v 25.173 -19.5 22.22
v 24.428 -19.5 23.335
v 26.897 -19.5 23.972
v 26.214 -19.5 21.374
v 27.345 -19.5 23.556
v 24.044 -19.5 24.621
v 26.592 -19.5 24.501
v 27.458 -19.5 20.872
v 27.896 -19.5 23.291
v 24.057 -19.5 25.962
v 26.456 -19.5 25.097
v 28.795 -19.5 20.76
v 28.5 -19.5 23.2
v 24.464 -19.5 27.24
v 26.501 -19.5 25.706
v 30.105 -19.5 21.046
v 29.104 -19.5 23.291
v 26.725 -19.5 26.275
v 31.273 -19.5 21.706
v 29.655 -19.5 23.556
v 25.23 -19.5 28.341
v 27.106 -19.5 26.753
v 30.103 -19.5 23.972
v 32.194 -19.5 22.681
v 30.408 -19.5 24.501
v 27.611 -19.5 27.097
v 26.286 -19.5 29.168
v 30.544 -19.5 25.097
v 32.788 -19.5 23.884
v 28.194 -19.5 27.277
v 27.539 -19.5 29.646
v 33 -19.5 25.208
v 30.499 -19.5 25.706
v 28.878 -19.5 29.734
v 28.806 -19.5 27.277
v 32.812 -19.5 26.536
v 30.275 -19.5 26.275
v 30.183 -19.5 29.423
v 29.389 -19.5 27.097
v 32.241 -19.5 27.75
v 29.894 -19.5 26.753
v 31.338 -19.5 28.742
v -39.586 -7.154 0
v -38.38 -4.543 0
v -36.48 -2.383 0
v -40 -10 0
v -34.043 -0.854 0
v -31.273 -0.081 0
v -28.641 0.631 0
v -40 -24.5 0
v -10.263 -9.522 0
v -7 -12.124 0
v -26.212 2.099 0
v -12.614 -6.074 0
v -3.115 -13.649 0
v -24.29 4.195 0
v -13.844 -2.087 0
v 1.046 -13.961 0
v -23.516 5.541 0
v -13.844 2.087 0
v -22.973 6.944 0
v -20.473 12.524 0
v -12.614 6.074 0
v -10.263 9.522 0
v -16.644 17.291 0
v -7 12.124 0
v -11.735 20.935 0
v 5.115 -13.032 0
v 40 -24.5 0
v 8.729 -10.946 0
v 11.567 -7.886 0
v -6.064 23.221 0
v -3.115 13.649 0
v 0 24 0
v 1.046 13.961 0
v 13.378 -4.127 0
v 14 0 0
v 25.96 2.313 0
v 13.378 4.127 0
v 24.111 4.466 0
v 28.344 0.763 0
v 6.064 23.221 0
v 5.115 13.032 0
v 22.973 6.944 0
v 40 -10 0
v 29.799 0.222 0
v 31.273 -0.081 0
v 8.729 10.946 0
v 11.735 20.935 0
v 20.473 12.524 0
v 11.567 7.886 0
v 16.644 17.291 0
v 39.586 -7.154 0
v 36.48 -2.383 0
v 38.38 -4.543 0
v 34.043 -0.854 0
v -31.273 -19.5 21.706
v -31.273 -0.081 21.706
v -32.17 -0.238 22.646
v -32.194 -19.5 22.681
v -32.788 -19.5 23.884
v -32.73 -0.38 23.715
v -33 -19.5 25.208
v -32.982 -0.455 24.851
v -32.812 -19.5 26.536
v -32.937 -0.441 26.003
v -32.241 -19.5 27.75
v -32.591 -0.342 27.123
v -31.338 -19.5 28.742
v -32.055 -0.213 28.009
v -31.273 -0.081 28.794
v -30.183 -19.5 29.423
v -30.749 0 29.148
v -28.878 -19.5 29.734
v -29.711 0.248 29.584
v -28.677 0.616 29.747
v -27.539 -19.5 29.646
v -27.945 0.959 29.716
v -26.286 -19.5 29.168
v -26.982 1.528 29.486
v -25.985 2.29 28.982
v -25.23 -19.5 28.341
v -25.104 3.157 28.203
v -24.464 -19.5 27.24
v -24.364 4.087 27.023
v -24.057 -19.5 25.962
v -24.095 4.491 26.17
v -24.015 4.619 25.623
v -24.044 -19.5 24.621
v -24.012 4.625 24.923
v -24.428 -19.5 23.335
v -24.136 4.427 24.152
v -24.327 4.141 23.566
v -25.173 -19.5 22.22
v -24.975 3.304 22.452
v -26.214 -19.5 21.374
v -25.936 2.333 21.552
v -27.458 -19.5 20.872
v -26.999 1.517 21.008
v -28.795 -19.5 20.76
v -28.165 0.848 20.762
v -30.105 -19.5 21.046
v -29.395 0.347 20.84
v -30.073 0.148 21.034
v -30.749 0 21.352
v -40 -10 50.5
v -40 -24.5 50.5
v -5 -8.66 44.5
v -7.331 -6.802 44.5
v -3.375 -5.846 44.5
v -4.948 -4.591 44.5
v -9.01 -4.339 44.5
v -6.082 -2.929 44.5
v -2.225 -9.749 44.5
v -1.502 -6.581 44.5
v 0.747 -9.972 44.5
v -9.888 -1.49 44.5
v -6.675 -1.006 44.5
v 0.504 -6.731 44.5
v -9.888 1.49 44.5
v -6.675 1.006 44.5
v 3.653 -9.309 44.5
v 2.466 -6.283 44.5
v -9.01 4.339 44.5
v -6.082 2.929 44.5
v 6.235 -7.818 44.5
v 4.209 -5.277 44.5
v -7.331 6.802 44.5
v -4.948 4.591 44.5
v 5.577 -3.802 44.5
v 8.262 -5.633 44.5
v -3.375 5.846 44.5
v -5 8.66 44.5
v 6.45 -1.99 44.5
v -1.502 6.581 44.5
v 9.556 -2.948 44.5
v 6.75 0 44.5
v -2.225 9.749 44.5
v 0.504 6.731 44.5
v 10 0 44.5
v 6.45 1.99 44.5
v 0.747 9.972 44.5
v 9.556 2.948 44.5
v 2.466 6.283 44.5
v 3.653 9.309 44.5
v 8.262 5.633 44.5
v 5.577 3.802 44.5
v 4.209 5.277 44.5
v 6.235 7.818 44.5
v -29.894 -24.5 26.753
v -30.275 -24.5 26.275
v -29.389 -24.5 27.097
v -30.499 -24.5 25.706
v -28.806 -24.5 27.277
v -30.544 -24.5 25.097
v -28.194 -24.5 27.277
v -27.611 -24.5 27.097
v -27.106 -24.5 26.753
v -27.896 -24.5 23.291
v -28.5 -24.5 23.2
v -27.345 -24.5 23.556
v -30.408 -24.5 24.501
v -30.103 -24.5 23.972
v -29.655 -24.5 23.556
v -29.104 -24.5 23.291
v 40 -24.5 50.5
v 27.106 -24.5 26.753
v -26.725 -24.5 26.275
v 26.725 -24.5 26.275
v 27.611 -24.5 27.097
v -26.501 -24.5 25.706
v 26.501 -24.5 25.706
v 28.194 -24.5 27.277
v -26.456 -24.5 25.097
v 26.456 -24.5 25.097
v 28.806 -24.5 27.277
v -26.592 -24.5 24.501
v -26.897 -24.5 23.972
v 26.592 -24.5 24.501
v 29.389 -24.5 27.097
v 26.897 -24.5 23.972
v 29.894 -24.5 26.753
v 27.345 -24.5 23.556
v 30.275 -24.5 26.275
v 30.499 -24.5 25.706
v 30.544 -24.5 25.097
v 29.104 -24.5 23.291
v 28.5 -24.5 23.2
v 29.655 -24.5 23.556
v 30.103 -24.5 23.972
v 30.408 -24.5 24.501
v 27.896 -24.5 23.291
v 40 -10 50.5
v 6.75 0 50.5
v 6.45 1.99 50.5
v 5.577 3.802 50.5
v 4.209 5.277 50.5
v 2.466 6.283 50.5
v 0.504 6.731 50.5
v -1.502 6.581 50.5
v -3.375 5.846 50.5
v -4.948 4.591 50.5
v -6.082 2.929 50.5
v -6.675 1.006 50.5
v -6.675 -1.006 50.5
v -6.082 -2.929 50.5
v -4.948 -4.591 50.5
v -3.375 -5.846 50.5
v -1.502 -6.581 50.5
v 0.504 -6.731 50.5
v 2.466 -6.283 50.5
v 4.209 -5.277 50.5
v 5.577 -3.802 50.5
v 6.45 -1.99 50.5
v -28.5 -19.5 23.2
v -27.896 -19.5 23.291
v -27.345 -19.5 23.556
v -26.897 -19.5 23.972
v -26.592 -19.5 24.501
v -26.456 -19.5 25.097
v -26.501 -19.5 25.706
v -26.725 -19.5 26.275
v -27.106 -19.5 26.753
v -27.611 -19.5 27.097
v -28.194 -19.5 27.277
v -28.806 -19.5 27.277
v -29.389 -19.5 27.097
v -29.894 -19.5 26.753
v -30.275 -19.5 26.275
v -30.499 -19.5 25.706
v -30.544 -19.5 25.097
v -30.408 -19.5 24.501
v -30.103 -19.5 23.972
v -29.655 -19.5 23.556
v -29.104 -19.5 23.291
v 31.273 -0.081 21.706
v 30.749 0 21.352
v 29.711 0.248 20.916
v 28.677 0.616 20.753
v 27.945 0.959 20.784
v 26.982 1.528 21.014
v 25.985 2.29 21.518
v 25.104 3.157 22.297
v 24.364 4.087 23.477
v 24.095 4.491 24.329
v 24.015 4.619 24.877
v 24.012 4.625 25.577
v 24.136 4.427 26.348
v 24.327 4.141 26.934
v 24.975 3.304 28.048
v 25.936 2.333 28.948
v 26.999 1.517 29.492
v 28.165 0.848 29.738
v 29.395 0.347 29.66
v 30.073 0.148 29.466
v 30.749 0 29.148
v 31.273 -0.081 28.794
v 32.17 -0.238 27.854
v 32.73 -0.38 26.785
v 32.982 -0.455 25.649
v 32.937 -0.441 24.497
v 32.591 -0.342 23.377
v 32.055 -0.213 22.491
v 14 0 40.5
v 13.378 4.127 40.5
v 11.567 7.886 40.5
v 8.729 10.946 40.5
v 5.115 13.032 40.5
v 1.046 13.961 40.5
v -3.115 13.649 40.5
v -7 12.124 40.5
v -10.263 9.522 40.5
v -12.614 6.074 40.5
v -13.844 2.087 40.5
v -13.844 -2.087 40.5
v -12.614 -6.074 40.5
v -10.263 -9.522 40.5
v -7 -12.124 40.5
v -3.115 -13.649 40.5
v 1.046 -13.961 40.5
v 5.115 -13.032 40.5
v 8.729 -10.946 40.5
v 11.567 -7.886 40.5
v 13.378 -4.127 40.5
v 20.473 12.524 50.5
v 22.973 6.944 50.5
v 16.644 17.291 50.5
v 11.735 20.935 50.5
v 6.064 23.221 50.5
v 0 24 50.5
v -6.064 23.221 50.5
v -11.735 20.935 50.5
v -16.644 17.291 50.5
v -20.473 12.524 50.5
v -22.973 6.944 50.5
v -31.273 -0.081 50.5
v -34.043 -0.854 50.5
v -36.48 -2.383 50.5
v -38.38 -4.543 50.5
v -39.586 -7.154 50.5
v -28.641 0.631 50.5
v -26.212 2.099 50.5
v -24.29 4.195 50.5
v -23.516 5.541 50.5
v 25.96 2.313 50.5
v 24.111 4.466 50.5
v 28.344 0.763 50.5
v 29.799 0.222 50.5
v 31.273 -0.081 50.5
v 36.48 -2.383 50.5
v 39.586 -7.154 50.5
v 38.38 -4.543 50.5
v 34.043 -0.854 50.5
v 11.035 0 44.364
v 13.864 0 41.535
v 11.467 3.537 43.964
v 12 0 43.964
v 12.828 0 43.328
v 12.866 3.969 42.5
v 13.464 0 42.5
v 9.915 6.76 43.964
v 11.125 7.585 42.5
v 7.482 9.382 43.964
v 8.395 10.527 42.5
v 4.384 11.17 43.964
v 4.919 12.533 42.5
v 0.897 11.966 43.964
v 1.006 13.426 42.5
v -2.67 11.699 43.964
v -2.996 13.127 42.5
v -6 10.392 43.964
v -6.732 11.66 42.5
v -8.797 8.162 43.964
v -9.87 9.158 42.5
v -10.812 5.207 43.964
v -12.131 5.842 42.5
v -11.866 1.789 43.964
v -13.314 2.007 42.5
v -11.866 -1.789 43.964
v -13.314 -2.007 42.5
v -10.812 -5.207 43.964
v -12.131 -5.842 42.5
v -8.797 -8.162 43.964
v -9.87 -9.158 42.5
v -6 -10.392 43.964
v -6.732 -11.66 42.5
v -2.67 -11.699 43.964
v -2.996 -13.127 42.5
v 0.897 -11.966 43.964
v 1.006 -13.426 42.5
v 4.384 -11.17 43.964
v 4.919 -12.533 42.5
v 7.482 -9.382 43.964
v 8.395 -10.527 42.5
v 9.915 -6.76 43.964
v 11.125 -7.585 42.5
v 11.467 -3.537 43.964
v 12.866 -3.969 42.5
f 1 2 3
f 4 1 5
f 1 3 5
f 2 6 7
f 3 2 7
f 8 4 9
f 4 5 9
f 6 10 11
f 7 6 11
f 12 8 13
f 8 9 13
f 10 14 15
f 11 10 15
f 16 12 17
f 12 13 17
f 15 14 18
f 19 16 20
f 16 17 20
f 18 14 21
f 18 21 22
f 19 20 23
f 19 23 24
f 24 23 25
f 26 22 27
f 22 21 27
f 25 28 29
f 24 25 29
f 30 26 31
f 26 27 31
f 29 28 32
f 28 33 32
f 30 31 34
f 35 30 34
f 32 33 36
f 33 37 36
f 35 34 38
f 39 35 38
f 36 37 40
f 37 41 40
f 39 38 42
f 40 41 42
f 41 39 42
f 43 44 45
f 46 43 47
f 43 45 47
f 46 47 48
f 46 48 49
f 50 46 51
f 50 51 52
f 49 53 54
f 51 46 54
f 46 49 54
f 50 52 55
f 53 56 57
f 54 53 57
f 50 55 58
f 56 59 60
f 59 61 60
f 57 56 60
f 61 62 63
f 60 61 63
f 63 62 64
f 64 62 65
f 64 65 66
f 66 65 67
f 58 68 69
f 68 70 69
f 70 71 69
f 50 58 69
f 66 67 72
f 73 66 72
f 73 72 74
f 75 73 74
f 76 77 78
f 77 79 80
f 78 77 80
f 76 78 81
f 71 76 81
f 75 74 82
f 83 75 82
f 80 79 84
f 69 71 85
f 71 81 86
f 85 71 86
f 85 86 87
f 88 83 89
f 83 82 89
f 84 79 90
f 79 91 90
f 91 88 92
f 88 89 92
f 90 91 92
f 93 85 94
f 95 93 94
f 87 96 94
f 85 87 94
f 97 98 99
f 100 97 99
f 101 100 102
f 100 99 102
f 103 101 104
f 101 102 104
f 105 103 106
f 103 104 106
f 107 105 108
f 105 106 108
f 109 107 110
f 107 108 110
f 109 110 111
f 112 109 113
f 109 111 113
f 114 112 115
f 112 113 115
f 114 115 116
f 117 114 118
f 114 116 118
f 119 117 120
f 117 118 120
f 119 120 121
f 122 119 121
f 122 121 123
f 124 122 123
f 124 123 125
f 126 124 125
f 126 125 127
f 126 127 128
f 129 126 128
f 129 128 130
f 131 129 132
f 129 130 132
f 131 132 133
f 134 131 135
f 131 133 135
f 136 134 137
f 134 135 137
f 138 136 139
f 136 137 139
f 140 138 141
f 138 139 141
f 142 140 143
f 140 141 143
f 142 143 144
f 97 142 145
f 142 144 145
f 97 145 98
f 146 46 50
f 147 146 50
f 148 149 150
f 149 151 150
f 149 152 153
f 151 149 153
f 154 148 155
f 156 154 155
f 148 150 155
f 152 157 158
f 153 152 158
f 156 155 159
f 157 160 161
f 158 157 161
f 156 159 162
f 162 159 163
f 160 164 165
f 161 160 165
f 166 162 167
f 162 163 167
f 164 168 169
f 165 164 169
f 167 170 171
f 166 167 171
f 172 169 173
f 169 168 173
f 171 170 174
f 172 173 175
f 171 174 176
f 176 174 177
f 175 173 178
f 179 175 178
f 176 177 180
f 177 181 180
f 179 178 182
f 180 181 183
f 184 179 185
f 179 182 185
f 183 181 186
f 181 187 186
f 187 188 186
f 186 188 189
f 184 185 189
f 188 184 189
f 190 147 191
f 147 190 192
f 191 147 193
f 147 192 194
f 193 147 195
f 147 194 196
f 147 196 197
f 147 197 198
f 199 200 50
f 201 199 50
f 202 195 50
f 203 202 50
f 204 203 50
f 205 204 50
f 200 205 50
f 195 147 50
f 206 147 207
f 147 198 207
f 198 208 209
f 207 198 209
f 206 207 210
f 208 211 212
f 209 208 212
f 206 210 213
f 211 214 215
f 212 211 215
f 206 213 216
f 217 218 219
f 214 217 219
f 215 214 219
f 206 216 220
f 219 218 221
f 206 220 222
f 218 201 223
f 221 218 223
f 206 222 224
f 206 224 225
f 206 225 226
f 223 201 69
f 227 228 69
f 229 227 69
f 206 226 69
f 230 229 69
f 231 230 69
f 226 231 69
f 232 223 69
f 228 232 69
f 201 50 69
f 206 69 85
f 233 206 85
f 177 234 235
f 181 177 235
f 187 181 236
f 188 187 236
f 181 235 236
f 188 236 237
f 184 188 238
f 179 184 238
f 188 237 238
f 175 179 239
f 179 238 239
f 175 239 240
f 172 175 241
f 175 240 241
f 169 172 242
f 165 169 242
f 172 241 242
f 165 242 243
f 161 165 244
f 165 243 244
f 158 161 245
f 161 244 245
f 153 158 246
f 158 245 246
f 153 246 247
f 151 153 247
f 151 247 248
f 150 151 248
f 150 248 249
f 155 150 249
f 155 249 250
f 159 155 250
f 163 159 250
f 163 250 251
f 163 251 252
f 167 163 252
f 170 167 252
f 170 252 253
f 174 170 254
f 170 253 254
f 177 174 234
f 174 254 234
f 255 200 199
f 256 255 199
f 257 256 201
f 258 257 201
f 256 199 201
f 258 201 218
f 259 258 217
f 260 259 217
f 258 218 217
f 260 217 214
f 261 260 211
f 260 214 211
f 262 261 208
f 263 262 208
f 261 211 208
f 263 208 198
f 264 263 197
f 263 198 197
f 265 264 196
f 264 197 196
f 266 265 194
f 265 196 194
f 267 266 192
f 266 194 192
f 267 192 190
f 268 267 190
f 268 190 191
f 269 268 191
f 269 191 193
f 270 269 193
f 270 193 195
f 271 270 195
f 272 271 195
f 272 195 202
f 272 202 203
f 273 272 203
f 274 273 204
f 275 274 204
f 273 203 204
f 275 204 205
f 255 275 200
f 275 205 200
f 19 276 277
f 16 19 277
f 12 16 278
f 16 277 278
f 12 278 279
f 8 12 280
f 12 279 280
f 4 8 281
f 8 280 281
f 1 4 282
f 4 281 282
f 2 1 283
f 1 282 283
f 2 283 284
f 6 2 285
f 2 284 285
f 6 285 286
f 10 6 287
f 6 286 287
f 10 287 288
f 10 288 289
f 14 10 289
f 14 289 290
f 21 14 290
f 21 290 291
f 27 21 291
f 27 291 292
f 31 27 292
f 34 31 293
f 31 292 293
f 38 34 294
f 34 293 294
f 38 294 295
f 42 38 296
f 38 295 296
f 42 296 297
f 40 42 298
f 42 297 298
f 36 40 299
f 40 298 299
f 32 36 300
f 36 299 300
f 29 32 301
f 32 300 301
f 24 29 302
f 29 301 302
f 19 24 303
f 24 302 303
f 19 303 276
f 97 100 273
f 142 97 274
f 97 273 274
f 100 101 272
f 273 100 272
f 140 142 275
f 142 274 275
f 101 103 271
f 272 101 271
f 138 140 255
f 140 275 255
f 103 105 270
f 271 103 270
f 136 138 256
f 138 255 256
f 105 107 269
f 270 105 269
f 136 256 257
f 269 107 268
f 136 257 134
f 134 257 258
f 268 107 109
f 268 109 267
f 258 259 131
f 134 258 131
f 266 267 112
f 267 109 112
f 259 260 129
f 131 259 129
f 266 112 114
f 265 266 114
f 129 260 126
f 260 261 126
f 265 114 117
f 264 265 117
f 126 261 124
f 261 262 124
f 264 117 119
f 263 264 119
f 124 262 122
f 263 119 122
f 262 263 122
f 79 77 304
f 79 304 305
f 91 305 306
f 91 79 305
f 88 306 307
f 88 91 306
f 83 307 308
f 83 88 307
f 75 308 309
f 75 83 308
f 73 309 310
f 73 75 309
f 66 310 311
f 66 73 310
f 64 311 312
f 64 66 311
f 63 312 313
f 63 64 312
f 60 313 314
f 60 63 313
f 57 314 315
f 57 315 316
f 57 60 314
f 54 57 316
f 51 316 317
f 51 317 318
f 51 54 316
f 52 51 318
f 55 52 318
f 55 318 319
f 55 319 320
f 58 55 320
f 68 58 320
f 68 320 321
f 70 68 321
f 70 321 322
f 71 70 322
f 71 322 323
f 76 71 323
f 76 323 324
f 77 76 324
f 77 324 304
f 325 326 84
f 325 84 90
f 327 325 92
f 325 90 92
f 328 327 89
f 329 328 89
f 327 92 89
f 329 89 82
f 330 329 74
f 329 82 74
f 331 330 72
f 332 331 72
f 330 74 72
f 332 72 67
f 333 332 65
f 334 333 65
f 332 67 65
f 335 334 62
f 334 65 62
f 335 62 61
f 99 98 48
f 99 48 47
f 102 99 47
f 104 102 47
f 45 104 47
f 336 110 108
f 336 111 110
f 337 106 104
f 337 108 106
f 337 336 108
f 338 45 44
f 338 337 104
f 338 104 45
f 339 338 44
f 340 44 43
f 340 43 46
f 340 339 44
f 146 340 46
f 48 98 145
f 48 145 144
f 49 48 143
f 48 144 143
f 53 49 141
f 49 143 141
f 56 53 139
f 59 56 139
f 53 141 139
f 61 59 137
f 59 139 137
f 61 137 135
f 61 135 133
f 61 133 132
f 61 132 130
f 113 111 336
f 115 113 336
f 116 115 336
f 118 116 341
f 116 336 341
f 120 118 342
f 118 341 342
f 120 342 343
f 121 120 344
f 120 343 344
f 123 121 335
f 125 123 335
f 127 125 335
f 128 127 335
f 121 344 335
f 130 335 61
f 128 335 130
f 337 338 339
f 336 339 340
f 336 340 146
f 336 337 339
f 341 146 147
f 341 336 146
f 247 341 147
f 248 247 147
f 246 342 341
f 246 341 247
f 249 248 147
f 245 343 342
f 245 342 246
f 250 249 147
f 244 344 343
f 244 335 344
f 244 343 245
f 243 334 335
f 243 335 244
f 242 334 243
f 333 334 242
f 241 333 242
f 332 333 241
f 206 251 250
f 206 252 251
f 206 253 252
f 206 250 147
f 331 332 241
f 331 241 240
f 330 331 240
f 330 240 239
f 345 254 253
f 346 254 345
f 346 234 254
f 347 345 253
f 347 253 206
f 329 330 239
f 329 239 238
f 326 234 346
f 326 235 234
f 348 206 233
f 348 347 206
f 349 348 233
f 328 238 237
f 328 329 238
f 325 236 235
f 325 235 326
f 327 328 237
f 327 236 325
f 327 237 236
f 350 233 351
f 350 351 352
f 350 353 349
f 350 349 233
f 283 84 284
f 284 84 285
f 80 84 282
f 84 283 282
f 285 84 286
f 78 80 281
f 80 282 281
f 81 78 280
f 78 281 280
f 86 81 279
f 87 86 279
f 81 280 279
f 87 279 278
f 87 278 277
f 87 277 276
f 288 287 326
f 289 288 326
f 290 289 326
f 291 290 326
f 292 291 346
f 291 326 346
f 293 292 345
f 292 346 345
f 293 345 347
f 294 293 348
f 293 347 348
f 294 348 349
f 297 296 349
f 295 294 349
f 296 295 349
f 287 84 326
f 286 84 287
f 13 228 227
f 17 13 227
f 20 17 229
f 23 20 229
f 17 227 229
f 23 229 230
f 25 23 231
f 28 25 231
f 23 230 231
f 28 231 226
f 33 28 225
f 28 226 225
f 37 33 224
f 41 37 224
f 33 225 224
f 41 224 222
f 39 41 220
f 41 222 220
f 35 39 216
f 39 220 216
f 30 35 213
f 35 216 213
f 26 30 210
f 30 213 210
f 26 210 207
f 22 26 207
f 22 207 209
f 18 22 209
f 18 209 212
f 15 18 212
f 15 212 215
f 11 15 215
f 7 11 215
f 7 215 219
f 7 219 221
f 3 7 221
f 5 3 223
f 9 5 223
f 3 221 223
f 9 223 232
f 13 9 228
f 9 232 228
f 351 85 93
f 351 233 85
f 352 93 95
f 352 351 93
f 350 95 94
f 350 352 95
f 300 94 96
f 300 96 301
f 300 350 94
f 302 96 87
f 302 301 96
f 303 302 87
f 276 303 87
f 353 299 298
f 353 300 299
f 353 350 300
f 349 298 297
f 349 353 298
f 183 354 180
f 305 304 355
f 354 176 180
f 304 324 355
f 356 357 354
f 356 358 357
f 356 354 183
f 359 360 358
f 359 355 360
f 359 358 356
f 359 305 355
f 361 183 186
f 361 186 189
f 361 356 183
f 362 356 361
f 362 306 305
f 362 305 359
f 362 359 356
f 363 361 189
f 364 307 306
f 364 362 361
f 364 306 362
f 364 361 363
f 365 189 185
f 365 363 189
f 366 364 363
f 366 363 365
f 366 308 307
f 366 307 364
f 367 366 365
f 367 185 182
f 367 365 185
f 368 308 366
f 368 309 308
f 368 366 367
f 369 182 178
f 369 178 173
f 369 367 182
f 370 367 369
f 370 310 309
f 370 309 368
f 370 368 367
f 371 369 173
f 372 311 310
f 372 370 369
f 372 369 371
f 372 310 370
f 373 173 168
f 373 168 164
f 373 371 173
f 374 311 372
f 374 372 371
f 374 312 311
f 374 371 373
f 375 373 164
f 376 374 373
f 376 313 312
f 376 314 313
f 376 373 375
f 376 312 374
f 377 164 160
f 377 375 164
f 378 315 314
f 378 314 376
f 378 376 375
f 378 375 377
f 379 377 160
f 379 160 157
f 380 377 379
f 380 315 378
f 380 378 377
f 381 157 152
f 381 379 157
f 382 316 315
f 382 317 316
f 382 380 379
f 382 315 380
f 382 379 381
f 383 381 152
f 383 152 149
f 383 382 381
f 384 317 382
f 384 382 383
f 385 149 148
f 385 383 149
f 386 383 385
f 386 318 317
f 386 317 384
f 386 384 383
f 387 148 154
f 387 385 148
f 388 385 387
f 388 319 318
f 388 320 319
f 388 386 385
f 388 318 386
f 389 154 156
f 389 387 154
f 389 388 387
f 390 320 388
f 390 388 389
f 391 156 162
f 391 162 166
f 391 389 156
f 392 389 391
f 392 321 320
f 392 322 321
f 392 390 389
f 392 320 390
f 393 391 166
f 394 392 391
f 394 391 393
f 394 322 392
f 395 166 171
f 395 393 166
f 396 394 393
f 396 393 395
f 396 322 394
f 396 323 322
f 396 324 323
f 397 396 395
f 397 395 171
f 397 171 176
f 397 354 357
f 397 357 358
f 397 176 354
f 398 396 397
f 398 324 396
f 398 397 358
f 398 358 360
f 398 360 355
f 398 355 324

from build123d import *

# Parameters (mm, degrees)
SKETCH1_R               = 14
BOSS_EXTRUDE1_DEPTH     = 50.5
BOSS_EXTRUDE3_START     = -6
SKETCH5_R               = 14
SKETCH5_R_2             = 6.75
BOSS_EXTRUDE3_DEPTH     = 6
FILLET3_R               = 4
FILLET1_R               = 10
FILLET2_R               = 10
CUT_EXTRUDE1_DEPTH      = 50.5
CUT_EXTRUDE1_DEPTH_BACK = 50.5
SKETCH2_R               = 4.5
SKETCH4_W               = 80
SKETCH4_H               = 50.5
SKETCH4_R               = 2.05
BOSS_EXTRUDE2_DEPTH     = 5


with BuildPart() as part:
    # Sketch1 → Boss-Extrude1 (new body)
    with BuildSketch(Plane.XY):
        with BuildLine():
            Line((-40, 0), (-40, -24.5))
            Line((-40, -24.5), (40, -24.5))
            Line((40, -24.5), (40, 0))
            Line((40, 0), (24, 0))
            ThreePointArc((24, 0), (0, 24), (-24, 0))
            Line((-24, 0), (-40, 0))
        make_face()
        Circle(SKETCH1_R, mode=Mode.SUBTRACT)
    extrude(amount=BOSS_EXTRUDE1_DEPTH)

    # Sketch5 → Boss-Extrude3 (add)
    with BuildSketch(Plane.XY.offset(50.5).offset(BOSS_EXTRUDE3_START)):
        Circle(SKETCH5_R)
        Circle(SKETCH5_R_2, mode=Mode.SUBTRACT)
    extrude(amount=BOSS_EXTRUDE3_DEPTH)

    # Fillet3
    fillet3_edges = [part.edges().sort_by_distance(p)[0] for p in [
        (-14, 0, 44.5),
    ]]
    fillet(fillet3_edges, radius=FILLET3_R)

    # Fillet1
    fillet1_edges = [part.edges().sort_by_distance(p)[0] for p in [
        (40, 0, 25.25),
        (-40, 0, 25.25),
    ]]
    fillet(fillet1_edges, radius=FILLET1_R)

    # Fillet2
    fillet2_edges = [part.edges().sort_by_distance(p)[0] for p in [
        (-24, 0, 25.25),
        (24, 0, 25.25),
    ]]
    fillet(fillet2_edges, radius=FILLET2_R)

    # Sketch2 → Cut-Extrude1 (cut, two sides: drawn at the far end of the back side and taken through both)
    with BuildSketch(Plane(origin=(0, 0, 0), x_dir=(1, 0, 0), z_dir=(0, 1, 0)).offset(-CUT_EXTRUDE1_DEPTH_BACK)):
        with Locations((28.5, -25.25)):
            Circle(SKETCH2_R)
        with Locations((-28.5, -25.25)):
            Circle(SKETCH2_R)
    extrude(amount=CUT_EXTRUDE1_DEPTH + CUT_EXTRUDE1_DEPTH_BACK, mode=Mode.SUBTRACT)

    # Sketch4 → Boss-Extrude2 (add)
    with BuildSketch(Plane.XZ.offset(24.5)):
        with Locations((0, 25.25)):
            Rectangle(SKETCH4_W, SKETCH4_H)
        with Locations((-28.5, 25.25)):
            Circle(SKETCH4_R, mode=Mode.SUBTRACT)
        with Locations((28.5, 25.25)):
            Circle(SKETCH4_R, mode=Mode.SUBTRACT)
    extrude(amount=-BOSS_EXTRUDE2_DEPTH)


solid = part.part
